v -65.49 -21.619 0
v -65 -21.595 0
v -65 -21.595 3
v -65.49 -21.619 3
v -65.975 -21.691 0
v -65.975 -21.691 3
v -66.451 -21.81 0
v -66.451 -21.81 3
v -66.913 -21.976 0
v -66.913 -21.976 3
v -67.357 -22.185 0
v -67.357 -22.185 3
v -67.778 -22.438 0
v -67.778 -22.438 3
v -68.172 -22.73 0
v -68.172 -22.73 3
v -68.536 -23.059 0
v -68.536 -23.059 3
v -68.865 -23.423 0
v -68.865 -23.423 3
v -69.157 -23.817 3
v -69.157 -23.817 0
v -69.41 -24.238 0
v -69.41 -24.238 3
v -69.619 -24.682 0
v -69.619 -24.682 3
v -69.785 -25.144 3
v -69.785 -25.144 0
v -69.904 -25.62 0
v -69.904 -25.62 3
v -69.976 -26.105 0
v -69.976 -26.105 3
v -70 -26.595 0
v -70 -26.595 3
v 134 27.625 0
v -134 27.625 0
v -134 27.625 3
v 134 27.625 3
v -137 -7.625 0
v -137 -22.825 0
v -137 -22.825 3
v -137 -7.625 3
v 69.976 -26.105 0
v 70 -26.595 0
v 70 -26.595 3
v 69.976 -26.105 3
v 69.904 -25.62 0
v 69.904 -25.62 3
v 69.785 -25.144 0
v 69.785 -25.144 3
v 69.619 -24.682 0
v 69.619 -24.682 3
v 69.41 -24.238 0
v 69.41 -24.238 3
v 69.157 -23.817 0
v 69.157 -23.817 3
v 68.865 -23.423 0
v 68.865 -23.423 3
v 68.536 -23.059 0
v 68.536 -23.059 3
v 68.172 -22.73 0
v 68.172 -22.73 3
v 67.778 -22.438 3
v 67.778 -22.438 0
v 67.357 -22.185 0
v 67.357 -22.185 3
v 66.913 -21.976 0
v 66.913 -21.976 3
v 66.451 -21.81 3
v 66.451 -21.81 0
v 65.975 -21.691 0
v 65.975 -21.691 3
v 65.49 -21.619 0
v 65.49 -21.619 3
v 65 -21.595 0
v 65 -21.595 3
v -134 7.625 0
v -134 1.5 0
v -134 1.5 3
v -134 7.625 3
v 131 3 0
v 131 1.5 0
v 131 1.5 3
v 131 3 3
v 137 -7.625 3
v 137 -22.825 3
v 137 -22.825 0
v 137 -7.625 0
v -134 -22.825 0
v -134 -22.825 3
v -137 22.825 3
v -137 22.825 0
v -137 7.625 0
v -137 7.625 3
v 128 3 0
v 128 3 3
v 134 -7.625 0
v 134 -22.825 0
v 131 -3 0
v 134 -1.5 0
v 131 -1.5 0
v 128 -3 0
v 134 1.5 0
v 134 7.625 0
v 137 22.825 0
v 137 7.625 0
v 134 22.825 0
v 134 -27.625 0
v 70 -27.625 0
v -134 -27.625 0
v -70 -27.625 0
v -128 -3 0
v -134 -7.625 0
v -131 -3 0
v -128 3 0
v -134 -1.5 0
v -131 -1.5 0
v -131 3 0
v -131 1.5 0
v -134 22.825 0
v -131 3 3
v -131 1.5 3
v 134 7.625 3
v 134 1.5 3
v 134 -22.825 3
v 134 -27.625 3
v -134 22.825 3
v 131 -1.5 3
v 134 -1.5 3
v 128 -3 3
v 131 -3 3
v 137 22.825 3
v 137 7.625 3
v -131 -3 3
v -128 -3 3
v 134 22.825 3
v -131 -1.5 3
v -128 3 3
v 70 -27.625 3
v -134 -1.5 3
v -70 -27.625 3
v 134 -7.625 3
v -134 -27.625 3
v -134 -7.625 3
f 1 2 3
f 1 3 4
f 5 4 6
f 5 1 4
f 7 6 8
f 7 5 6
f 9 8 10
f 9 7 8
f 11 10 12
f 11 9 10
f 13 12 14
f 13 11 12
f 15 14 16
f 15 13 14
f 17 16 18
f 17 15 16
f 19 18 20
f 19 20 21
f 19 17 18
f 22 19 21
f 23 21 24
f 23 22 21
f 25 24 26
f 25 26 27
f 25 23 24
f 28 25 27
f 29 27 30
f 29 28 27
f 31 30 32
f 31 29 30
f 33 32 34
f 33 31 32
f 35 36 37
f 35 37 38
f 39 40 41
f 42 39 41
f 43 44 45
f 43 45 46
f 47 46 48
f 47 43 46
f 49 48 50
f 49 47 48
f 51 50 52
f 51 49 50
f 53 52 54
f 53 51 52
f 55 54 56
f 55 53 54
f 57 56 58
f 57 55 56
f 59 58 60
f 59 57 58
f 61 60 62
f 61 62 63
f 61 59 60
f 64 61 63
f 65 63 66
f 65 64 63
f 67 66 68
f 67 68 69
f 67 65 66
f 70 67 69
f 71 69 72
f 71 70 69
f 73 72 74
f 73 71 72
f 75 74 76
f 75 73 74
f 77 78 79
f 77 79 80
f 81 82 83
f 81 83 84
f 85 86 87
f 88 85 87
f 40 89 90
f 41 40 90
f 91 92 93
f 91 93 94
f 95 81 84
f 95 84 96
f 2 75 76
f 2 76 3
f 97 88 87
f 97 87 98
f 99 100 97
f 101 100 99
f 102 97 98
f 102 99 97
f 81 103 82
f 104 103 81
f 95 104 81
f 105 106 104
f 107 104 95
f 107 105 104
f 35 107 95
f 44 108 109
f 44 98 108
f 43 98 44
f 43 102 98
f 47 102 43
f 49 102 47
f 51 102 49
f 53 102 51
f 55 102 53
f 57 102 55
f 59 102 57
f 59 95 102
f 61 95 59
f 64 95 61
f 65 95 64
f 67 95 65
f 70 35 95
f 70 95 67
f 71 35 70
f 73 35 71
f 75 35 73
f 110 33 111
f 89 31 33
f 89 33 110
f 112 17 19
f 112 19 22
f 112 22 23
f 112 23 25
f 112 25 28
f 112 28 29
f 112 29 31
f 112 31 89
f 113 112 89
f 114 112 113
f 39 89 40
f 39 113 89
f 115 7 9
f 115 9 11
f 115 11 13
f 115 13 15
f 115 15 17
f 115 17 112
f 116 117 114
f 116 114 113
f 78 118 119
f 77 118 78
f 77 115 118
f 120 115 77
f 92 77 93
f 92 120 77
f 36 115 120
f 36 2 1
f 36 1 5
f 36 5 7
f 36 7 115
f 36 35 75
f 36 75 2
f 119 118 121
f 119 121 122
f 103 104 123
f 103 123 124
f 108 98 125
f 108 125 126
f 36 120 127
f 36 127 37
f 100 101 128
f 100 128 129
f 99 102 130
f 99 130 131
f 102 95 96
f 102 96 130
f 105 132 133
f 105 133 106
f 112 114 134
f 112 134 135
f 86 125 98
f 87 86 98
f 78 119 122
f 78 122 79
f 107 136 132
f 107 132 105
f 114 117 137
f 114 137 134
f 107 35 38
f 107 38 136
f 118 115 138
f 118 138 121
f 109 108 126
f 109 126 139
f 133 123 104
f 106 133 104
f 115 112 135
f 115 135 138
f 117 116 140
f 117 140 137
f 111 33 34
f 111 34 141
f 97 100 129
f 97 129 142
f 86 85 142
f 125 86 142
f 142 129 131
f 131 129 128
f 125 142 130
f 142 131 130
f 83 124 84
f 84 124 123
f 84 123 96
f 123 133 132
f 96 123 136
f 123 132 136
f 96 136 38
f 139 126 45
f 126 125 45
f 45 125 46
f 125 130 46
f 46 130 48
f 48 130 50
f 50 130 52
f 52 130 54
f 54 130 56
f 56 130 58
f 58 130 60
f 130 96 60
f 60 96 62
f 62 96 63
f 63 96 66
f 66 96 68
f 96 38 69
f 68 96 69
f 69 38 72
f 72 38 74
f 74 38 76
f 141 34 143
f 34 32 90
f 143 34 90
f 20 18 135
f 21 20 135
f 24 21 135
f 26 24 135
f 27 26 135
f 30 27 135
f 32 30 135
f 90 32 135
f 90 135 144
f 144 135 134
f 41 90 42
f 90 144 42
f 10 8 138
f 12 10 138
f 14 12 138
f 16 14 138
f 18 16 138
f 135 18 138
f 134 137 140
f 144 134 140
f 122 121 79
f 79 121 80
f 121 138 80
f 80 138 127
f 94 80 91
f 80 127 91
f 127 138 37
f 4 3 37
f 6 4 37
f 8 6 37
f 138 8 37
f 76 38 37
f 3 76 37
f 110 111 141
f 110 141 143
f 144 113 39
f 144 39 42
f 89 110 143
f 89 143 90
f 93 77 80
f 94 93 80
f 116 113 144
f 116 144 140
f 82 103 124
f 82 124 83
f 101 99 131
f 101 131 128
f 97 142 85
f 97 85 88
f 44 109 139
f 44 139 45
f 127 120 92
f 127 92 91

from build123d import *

# Parameters (mm, degrees)
SALIENTE_EXTRUIR1_DEPTH = 3
CROQUIS2_W              = 3
CROQUIS2_H              = 15.2
SALIENTE_EXTRUIR2_DEPTH = 3
CROQUIS3_W              = 3
CROQUIS3_H              = 15.2
SALIENTE_EXTRUIR3_DEPTH = 3


with BuildPart() as part:
    # Croquis1 → Saliente-Extruir1 (new body)
    with BuildSketch(Plane.XY):
        with BuildLine():
            Line((134, -27.625), (70, -27.625))
            Line((70, -27.625), (70, -26.595))
            ThreePointArc((70, -26.595), (68.535533906, -23.059466094), (65, -21.595))
            Line((65, -21.595), (-65, -21.595))
            ThreePointArc((-65, -21.595), (-68.535533906, -23.059466094), (-70, -26.595))
            Line((-70, -26.595), (-70, -27.625))
            Line((-70, -27.625), (-134, -27.625))
            Line((-134, -27.625), (-134, -1.5))
            Line((-134, -1.5), (-131, -1.5))
            Line((-131, -1.5), (-131, -3))
            Line((-131, -3), (-128, -3))
            Line((-128, -3), (-128, 3))
            Line((-128, 3), (-131, 3))
            Line((-131, 3), (-131, 1.5))
            Line((-131, 1.5), (-134, 1.5))
            Line((-134, 1.5), (-134, 27.625))
            Line((-134, 27.625), (134, 27.625))
            Line((134, 27.625), (134, 1.5))
            Line((134, 1.5), (131, 1.5))
            Line((131, 1.5), (131, 3))
            Line((131, 3), (128, 3))
            Line((128, 3), (128, -3))
            Line((128, -3), (131, -3))
            Line((131, -3), (131, -1.5))
            Line((131, -1.5), (134, -1.5))
            Line((134, -1.5), (134, -27.625))
        make_face()
    extrude(amount=SALIENTE_EXTRUIR1_DEPTH)

    # Croquis2 → Saliente-Extruir2 (add)
    with BuildSketch(Plane(origin=(134, 0, 0), x_dir=(0, 0, -1), z_dir=(1, 0, 0))):
        with Locations((-1.5, 15.225)):
            Rectangle(CROQUIS2_W, CROQUIS2_H)
        with Locations((-1.5, -15.225)):
            Rectangle(CROQUIS2_W, CROQUIS2_H)
    extrude(amount=SALIENTE_EXTRUIR2_DEPTH)

    # Croquis3 → Saliente-Extruir3 (add)
    with BuildSketch(Plane.ZY.offset(134)):
        with Locations((1.5, 15.225)):
            Rectangle(CROQUIS3_W, CROQUIS3_H)
        with Locations((1.5, -15.225)):
            Rectangle(CROQUIS3_W, CROQUIS3_H)
    extrude(amount=SALIENTE_EXTRUIR3_DEPTH)


solid = part.part
